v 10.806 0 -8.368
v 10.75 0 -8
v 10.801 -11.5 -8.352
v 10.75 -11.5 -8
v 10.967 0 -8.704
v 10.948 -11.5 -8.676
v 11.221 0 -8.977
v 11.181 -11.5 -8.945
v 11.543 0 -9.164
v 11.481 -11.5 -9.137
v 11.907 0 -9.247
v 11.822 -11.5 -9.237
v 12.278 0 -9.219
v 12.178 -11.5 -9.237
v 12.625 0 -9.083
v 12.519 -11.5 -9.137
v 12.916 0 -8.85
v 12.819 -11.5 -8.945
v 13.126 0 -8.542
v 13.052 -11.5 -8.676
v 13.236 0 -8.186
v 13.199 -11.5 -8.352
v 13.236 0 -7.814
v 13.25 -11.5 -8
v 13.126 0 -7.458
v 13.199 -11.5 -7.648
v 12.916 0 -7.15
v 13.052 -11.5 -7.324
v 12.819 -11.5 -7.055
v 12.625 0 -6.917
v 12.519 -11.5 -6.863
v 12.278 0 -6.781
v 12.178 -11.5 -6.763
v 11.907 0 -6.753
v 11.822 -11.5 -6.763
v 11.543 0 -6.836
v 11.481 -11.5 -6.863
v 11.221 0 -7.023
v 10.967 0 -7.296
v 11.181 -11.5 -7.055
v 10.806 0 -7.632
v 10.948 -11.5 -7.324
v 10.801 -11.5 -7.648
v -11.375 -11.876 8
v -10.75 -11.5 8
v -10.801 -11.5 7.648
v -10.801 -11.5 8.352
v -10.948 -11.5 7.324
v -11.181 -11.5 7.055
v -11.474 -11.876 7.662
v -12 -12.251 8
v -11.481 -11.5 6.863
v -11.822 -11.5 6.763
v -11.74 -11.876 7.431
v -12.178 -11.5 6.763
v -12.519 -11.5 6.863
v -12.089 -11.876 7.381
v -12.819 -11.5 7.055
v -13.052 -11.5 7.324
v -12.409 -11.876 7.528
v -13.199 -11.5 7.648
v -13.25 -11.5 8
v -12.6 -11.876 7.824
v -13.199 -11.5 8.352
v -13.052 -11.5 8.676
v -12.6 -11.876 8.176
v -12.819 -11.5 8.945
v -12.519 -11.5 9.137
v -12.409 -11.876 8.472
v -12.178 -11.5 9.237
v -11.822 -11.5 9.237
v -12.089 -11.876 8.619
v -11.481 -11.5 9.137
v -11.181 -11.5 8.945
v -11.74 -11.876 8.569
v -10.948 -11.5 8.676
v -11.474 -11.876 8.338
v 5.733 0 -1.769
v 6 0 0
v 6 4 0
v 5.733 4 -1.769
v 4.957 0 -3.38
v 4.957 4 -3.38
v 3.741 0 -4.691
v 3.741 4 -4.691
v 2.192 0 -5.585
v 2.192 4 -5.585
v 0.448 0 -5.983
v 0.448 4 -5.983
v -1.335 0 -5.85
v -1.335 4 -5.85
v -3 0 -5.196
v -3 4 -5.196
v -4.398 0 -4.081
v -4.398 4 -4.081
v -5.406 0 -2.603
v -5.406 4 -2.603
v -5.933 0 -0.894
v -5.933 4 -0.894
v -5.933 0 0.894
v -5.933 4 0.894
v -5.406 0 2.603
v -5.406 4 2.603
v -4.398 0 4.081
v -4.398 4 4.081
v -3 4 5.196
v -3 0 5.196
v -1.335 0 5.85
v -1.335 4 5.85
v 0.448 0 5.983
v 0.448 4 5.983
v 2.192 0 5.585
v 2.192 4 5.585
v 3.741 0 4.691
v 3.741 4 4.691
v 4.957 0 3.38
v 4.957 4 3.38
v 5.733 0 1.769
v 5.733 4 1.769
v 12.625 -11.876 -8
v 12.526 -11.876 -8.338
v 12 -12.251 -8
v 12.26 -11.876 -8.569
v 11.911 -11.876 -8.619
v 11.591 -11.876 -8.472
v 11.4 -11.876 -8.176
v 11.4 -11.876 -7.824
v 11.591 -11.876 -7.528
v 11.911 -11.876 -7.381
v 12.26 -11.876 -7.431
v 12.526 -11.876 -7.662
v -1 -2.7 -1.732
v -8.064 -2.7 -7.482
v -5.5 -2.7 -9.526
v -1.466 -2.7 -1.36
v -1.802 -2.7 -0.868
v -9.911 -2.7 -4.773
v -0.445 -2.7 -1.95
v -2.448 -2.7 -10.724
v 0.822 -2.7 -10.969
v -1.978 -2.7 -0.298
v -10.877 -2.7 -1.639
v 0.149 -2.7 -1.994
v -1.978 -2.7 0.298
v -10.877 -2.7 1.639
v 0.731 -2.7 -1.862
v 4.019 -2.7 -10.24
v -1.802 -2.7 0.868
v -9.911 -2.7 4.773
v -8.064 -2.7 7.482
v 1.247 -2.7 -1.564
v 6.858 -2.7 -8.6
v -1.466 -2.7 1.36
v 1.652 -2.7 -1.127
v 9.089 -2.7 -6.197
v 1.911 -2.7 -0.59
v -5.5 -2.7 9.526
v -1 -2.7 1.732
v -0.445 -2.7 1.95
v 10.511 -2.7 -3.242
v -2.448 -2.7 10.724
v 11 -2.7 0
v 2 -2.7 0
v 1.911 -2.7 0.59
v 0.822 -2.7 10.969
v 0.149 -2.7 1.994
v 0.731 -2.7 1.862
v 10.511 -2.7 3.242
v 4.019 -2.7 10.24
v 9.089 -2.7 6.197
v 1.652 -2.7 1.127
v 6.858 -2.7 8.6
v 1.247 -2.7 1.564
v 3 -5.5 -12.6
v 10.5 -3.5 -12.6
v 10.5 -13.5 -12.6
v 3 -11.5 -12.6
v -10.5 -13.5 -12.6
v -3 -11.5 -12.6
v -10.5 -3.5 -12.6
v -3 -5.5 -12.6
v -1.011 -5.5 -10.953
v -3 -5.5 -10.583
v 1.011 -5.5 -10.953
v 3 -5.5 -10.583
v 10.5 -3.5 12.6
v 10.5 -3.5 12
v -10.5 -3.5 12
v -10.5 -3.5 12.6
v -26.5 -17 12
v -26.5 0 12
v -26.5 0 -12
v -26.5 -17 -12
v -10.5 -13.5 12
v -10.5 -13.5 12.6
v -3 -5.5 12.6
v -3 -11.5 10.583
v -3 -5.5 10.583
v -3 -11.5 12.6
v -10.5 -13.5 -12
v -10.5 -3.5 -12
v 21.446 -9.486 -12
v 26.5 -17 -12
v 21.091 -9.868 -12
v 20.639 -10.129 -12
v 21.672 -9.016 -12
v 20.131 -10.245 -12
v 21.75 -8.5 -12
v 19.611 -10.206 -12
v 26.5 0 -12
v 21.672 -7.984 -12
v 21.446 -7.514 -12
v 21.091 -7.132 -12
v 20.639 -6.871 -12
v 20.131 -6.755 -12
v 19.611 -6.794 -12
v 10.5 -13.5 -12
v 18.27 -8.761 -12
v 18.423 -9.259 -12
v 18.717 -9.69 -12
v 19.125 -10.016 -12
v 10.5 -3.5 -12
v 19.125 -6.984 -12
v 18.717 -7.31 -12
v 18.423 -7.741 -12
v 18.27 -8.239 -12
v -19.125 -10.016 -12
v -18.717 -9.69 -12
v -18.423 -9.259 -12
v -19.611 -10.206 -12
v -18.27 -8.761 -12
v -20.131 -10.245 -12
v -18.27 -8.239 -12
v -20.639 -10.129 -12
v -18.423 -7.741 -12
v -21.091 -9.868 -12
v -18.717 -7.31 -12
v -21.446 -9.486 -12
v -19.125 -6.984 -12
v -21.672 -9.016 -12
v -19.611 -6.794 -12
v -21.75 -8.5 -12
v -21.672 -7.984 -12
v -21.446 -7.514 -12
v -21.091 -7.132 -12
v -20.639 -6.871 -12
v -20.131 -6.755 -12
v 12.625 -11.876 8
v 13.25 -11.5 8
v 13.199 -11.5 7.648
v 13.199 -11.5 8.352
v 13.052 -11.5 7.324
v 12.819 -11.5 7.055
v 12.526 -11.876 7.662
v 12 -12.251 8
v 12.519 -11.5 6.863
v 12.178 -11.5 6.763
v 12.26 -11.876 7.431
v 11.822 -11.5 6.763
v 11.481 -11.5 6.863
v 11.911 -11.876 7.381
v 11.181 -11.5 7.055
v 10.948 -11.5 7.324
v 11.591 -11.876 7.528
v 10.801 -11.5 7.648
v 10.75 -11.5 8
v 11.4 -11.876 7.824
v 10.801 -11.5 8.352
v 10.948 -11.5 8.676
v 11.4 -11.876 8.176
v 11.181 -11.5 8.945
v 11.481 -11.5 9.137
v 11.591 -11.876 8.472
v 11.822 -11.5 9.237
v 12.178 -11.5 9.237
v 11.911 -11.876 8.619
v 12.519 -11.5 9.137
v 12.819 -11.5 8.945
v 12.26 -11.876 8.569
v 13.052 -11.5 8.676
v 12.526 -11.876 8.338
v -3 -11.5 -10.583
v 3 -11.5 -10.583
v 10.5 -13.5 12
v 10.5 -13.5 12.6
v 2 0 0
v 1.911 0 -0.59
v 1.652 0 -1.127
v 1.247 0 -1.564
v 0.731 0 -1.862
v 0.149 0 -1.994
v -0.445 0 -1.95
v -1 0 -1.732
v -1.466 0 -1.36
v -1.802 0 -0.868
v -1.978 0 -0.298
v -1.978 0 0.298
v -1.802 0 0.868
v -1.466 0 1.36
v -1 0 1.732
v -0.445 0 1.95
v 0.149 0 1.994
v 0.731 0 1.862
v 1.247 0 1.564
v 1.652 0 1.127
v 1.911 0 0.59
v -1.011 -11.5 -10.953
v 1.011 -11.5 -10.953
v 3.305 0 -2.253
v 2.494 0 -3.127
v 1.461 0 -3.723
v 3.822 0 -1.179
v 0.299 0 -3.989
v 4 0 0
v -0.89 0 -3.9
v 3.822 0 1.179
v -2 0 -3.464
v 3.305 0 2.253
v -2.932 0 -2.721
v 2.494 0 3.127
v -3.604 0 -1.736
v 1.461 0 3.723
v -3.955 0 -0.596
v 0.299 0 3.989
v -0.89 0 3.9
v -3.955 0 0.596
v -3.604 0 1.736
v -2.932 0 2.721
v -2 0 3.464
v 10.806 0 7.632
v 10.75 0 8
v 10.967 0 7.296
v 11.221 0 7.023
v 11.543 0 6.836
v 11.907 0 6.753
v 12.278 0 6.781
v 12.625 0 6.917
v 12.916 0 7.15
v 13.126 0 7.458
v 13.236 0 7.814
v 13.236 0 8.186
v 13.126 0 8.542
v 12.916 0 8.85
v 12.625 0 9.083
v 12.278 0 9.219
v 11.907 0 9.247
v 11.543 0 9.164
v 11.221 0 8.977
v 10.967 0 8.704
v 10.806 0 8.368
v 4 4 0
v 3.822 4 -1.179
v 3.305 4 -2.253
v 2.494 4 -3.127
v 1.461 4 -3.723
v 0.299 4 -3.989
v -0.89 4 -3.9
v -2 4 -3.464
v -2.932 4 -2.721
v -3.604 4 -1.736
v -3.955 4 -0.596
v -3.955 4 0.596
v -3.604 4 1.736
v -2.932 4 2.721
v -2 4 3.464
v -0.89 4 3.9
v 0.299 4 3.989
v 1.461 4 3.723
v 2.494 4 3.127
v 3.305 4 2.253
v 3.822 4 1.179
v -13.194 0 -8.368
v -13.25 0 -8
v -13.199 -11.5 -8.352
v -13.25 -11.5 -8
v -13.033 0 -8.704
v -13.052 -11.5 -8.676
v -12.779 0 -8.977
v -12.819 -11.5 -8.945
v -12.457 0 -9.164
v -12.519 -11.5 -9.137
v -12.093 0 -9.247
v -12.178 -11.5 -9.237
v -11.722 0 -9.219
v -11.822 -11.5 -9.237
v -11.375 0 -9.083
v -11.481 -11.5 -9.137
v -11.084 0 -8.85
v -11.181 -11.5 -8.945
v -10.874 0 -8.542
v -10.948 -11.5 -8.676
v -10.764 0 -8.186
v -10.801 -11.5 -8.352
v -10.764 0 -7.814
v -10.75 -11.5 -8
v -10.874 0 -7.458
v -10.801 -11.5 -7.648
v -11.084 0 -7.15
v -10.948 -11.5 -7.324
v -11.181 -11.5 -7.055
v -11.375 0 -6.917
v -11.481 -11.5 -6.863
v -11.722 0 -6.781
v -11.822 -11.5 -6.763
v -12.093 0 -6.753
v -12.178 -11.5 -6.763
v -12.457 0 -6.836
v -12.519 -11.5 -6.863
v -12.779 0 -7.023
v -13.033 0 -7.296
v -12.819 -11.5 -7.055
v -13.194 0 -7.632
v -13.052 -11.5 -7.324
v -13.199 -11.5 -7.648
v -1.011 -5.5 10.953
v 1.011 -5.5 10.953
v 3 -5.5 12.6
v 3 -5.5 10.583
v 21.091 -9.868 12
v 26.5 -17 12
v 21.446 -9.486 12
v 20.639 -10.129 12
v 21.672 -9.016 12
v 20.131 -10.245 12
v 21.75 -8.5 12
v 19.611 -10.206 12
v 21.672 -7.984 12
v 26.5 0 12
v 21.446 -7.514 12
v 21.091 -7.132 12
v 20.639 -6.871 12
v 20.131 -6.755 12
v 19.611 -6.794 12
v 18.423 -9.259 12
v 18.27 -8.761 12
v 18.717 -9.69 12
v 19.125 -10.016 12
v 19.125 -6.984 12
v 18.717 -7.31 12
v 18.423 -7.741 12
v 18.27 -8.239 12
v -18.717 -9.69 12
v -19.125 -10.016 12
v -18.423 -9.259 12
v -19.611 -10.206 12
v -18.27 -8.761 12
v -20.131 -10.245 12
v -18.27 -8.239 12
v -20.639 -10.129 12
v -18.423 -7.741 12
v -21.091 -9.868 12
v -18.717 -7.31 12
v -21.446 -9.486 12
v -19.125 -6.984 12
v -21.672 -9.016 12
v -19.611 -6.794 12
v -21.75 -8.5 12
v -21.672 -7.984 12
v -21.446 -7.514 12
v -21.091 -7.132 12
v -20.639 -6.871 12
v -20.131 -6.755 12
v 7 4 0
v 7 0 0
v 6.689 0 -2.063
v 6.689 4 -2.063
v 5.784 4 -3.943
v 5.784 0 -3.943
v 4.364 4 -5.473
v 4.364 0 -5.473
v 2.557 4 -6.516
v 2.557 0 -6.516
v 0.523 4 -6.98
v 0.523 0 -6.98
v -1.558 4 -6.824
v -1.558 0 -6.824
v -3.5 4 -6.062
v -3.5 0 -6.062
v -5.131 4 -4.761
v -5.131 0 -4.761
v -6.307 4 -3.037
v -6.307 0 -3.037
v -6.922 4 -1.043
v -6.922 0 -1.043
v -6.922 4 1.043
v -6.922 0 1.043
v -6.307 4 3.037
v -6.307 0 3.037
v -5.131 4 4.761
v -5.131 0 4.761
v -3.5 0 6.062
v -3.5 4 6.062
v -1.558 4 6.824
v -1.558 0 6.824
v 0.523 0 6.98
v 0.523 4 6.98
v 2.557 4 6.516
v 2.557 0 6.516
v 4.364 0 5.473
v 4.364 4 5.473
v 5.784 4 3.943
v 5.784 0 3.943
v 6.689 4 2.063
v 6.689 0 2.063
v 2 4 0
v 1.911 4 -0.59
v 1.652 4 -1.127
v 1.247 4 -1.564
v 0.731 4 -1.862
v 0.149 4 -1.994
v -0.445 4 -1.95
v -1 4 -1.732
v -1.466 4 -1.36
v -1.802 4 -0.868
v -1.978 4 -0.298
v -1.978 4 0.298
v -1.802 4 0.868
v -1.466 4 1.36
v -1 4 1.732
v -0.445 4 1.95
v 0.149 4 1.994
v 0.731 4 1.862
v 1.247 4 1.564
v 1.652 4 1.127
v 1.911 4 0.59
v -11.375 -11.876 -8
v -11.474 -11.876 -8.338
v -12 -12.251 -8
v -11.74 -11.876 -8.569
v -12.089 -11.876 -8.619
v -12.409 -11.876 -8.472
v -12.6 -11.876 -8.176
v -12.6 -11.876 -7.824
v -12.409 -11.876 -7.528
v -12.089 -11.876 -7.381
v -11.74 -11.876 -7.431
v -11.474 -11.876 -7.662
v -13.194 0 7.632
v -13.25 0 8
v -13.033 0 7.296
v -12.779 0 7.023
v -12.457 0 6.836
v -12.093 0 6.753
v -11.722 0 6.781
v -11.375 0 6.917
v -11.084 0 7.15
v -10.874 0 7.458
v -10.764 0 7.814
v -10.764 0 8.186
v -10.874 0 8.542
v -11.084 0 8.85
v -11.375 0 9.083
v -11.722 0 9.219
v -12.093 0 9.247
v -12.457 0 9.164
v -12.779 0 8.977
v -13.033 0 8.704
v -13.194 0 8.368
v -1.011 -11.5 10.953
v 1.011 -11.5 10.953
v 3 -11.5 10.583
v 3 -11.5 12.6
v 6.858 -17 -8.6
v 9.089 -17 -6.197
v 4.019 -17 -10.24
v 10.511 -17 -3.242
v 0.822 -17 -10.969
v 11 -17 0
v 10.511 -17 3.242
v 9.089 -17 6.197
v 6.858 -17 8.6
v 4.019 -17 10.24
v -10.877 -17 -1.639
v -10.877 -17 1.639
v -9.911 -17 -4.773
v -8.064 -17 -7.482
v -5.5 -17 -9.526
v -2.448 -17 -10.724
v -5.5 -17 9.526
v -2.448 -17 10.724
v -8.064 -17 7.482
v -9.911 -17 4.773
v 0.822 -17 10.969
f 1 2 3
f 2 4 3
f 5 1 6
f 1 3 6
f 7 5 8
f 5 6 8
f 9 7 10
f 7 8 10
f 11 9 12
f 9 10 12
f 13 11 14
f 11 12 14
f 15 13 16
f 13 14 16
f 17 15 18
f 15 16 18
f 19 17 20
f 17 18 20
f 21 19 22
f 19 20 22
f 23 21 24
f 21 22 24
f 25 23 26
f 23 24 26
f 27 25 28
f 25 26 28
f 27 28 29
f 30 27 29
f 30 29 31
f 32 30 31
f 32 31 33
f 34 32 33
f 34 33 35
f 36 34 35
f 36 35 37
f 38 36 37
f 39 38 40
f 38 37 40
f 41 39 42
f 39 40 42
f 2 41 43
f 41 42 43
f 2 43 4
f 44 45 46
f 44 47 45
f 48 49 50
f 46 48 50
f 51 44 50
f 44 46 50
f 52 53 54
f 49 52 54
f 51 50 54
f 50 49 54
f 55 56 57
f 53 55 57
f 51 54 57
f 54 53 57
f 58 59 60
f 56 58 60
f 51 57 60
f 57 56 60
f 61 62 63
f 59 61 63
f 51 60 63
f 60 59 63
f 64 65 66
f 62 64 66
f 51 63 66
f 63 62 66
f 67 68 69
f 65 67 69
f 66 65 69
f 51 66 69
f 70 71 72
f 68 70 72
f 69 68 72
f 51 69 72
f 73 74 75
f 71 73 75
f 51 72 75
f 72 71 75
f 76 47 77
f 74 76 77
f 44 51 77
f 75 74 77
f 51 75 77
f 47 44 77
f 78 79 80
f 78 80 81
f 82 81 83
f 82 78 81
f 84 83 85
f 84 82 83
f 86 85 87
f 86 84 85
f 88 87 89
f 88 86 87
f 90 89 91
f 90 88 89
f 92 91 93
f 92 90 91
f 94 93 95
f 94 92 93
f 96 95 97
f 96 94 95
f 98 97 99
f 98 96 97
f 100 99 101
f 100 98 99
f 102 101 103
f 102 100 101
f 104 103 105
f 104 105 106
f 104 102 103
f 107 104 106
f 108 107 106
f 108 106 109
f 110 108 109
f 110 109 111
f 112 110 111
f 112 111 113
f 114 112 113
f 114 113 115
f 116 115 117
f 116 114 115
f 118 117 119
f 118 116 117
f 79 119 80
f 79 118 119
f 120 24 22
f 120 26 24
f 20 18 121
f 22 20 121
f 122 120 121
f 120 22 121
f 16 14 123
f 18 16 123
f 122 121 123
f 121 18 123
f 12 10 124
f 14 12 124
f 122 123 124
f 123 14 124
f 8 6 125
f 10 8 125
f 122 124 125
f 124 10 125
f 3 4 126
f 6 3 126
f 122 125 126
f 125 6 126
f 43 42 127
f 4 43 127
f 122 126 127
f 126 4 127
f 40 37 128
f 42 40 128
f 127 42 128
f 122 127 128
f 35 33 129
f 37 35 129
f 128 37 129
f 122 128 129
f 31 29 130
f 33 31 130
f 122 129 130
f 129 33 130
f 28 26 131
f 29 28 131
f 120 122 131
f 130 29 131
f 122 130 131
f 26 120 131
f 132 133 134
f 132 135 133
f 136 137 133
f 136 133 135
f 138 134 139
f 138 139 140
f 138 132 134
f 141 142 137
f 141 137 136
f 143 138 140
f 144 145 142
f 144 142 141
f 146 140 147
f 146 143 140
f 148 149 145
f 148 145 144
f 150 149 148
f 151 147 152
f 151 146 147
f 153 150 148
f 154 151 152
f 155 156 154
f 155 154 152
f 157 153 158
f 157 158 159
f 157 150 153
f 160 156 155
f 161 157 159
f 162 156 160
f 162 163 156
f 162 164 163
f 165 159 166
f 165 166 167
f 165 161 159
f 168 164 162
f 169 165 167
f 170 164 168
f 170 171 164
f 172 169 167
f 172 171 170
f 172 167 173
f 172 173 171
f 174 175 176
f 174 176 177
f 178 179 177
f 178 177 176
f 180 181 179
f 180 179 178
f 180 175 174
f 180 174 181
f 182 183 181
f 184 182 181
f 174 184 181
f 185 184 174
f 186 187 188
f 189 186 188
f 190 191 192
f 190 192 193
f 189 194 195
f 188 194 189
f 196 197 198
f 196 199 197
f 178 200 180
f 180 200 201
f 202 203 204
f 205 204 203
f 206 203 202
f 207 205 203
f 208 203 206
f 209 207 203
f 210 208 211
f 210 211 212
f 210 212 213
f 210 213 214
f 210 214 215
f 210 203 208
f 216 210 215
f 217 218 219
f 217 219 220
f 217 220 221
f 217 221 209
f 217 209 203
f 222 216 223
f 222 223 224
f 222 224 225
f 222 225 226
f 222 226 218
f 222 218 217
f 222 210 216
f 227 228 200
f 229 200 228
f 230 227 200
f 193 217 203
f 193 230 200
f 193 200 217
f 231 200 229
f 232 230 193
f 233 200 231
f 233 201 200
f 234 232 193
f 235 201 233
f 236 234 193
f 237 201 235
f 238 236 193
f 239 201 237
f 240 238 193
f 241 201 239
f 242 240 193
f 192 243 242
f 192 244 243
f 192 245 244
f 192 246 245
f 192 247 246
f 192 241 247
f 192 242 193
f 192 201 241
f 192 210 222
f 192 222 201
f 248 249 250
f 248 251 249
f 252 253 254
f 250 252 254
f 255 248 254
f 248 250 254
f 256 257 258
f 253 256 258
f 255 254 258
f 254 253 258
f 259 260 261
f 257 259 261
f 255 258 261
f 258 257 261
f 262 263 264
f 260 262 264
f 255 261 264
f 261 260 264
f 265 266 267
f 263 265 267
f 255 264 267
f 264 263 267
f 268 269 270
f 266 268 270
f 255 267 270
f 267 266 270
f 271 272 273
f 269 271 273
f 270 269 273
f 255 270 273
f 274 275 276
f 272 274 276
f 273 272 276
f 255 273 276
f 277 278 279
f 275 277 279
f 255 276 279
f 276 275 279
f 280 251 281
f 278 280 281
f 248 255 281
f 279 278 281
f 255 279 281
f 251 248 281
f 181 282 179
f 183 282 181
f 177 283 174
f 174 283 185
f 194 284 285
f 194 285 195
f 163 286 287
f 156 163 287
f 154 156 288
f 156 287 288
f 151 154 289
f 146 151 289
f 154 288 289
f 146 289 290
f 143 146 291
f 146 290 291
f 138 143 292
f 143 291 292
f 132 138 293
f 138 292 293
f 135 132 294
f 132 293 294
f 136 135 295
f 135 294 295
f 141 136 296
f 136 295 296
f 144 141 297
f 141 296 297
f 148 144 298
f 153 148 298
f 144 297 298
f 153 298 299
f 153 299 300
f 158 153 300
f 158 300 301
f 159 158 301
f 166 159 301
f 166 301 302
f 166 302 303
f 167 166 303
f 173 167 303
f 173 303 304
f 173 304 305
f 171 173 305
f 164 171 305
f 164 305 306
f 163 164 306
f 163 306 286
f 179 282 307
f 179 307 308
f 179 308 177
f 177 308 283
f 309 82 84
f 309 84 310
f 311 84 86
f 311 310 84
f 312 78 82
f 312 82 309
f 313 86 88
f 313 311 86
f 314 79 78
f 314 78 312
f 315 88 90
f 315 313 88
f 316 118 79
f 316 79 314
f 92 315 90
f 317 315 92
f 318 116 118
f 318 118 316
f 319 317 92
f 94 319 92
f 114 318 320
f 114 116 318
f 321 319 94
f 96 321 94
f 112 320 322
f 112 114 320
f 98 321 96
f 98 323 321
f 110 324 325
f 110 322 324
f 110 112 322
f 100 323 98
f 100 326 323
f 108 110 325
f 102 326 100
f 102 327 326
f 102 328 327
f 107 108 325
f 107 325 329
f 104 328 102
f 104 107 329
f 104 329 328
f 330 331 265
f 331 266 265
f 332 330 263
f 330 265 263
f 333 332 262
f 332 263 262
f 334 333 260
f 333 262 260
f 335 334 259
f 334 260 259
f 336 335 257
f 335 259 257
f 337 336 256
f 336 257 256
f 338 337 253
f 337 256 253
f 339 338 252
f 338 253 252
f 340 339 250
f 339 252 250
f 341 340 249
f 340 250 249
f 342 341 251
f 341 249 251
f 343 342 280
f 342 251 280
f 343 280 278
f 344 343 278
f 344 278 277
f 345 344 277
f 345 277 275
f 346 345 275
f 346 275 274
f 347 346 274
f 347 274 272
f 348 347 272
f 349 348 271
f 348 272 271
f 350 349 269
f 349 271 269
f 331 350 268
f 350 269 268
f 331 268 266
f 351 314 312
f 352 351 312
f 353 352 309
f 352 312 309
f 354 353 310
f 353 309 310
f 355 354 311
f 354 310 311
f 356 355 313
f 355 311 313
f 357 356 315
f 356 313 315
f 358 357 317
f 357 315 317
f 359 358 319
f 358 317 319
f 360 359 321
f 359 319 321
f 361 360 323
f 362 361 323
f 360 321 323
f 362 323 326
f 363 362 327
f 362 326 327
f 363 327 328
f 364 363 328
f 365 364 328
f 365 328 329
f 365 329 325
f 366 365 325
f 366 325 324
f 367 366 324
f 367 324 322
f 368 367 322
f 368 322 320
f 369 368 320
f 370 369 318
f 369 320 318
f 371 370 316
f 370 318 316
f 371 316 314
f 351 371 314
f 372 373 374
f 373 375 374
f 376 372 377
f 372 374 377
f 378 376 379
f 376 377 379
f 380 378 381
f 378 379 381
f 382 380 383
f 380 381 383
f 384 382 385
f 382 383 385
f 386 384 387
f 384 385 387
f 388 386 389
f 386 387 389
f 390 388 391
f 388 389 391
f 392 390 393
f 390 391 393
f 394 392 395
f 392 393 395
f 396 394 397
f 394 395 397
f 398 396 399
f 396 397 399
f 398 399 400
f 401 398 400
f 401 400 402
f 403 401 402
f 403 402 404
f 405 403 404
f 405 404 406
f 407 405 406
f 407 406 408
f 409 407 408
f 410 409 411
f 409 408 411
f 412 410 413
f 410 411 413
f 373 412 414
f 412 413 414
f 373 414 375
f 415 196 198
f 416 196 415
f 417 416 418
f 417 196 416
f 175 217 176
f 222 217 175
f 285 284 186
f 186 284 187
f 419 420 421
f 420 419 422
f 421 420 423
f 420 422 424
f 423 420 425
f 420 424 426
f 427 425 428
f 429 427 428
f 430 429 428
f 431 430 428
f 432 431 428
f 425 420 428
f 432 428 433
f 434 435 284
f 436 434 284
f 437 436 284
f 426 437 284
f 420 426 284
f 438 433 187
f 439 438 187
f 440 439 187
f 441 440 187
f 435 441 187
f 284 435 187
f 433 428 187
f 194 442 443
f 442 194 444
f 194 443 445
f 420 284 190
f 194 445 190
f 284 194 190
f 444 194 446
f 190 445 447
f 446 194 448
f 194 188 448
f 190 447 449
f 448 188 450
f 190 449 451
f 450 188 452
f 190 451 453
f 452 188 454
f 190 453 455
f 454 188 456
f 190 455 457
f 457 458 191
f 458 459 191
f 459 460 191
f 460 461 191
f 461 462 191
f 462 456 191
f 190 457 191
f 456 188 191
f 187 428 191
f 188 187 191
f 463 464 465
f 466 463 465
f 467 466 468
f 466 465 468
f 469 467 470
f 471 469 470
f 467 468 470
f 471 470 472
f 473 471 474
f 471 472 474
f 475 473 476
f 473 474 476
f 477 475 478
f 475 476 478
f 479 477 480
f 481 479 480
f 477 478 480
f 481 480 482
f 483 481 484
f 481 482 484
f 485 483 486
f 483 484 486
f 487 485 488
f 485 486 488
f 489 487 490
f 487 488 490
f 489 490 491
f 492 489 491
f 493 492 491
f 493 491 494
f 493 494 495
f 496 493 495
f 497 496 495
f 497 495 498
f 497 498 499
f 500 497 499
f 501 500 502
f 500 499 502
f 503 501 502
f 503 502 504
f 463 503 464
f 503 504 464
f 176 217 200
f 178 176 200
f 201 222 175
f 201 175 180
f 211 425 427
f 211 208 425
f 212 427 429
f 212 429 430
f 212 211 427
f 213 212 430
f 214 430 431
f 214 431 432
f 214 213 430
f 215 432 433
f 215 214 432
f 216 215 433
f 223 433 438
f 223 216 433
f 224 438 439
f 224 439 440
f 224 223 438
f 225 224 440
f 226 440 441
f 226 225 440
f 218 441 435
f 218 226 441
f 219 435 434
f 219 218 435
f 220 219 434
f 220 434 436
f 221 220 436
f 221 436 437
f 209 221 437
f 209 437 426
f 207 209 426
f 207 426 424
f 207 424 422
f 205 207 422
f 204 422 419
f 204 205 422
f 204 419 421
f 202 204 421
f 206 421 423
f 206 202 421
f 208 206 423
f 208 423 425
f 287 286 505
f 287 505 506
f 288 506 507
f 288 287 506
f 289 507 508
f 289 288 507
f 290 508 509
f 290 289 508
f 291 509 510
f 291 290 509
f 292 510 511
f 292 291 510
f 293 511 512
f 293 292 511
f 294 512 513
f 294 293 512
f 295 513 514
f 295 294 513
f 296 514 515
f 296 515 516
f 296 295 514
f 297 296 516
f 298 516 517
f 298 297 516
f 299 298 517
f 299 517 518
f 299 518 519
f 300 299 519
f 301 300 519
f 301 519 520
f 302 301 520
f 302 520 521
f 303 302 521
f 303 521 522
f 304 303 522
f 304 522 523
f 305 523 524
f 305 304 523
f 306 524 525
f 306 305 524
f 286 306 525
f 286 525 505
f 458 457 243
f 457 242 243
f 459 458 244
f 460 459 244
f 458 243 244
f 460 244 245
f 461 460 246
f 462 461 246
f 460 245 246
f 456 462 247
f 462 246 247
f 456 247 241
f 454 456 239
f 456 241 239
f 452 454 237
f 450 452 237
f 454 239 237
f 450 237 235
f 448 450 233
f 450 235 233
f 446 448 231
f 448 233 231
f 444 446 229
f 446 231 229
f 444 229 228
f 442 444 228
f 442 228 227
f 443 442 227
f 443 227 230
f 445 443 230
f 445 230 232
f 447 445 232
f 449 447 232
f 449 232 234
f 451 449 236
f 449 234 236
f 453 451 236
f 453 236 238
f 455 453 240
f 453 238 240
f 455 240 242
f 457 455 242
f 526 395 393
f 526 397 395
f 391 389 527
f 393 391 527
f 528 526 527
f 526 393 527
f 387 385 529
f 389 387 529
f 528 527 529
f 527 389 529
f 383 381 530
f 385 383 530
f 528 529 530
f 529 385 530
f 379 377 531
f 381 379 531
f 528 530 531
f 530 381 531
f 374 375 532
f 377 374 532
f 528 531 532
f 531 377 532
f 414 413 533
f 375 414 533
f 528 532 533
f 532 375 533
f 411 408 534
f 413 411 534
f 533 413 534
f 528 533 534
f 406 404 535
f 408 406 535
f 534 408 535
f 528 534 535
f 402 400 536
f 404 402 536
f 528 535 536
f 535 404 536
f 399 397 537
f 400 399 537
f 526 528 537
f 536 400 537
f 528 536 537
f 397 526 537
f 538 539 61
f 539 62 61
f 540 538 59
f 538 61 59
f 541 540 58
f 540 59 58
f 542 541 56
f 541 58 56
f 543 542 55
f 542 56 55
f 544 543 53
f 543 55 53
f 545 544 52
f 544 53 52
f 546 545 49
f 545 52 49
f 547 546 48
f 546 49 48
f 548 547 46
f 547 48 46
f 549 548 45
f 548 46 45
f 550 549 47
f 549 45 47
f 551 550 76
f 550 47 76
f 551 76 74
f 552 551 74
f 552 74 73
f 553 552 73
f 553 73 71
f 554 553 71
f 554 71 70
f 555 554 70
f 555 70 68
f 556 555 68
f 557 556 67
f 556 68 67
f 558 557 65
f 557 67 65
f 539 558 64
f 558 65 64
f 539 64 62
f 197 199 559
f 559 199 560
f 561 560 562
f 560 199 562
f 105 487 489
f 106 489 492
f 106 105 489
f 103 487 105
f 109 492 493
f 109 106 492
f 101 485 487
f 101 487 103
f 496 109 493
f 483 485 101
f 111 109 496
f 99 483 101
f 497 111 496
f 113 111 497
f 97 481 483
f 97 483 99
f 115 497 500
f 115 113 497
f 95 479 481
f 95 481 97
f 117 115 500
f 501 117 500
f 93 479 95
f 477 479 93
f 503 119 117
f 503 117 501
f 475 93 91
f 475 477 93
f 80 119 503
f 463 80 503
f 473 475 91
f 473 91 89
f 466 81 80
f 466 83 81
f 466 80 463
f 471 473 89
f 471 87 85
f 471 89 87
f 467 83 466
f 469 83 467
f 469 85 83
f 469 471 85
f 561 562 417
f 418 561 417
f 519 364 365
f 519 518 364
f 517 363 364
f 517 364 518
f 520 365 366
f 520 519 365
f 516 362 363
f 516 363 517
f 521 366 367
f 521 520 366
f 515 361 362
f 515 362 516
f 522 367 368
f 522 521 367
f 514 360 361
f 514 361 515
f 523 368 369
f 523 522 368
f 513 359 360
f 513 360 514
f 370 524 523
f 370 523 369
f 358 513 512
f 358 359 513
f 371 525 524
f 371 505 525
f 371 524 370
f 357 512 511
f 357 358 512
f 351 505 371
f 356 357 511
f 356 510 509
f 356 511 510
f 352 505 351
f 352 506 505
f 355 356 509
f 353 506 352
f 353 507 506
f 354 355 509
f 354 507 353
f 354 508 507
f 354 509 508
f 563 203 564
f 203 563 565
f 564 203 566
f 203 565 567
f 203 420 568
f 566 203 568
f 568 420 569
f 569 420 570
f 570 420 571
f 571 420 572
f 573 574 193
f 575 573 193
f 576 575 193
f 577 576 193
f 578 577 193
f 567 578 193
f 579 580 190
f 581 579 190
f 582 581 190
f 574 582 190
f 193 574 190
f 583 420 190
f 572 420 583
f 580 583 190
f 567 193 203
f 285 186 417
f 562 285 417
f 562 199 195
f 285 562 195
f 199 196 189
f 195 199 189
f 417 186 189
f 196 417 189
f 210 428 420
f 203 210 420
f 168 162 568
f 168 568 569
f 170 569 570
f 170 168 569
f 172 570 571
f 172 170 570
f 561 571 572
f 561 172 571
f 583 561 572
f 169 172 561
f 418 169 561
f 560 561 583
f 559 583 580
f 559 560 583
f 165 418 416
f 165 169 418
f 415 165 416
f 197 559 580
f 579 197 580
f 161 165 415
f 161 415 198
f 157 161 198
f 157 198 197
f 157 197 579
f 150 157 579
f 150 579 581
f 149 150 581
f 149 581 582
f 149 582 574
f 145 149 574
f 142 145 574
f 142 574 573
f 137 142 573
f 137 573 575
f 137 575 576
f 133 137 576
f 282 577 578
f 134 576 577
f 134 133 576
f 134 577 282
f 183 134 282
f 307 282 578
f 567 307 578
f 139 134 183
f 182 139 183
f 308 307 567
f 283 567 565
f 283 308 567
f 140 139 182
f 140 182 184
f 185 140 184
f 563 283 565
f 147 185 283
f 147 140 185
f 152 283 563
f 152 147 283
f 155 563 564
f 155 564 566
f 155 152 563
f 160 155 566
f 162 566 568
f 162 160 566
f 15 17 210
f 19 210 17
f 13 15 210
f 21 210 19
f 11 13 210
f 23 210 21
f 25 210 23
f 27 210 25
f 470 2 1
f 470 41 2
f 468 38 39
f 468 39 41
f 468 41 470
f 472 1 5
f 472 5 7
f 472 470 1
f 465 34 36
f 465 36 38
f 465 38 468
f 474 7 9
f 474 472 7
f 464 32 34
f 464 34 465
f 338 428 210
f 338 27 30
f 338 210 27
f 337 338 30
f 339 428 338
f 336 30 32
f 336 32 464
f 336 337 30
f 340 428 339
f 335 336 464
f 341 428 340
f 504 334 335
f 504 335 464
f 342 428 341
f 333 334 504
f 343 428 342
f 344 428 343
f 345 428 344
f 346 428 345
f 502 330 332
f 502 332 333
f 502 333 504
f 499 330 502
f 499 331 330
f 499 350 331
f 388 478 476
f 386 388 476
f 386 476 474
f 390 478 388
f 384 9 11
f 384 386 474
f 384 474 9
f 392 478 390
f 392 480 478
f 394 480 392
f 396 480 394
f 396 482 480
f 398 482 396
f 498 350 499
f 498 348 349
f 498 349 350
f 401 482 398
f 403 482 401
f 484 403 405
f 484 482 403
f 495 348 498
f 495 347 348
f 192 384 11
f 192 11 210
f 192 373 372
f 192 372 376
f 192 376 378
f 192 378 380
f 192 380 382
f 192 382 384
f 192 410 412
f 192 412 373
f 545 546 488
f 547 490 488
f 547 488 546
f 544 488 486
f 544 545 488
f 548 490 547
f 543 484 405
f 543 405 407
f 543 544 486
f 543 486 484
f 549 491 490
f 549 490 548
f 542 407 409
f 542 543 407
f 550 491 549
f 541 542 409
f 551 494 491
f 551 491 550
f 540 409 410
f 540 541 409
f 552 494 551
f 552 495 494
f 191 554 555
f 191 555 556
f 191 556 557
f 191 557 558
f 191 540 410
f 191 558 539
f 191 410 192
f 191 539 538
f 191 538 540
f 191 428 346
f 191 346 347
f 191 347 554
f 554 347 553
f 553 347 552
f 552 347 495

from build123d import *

# Parameters (mm, degrees)
SKETCH_1_R          = 1.75
EXTRUDE_1_DEPTH     = 12
SKETCH_3_R          = 2
CUT_EXTRUDE_1_DEPTH = 18
SKETCH_4_W          = 22.4
SKETCH_4_H          = 14.3
SKETCH_4_W_2        = 6
SKETCH_4_H_2        = 6
EXTRUDE_2_DEPTH     = 1.2
SKETCH_5_W          = 21
SKETCH_5_H          = 10
SKETCH_5_W_2        = 6
SKETCH_5_H_2        = 6
EXTRUDE_3_DEPTH     = 0.6
SKETCH_14_W         = 24.4
SKETCH_14_H         = 23.6
EXTRUDE_6_DEPTH     = 14.3
CUT_EXTRUDE_START   = 2.7
SKETCH_12_R         = 11
CUT_EXTRUDE_6_DEPTH = 14.3
SKETCH_15_W         = 6
SKETCH_15_H         = 6
CUT_EXTRUDE_7_DEPTH = 25.4
SKETCH_6_R          = 7
SKETCH_6_R_2        = 6
SKETCH_6_R_3        = 4
SKETCH_6_R_4        = 2
EXTRUDE_4_DEPTH     = 4
M3X0_51_D           = 2.5
M3X0_51_DEPTH       = 11.5
M3X0_51_TIP         = 0.751075774


with BuildPart() as part:
    # Sketch 1 → Extrude 1 (new body, symmetric)
    with BuildSketch(Plane.XY):
        Polygon((11.2, -17), (11.2, -2.7), (0, -2.7), (0, 0), (26.5, 0), (26.5, -17), align=None)
        with Locations((20, -8.5)):
            Circle(SKETCH_1_R, mode=Mode.SUBTRACT)
    extrude_1 = extrude(amount=EXTRUDE_1_DEPTH, both=True)

    # Mirror 1: Extrude 1 across plane
    add(extrude_1.mirror(Plane(origin=(0, -2.7, -12), x_dir=(0, 0, 1), z_dir=(-1, 0, 0))))

    # Sketch 3 → Cut-Extrude 1 (cut, through all)
    with BuildSketch(Plane(origin=(0, 0, 0), x_dir=(1, 0, 0), z_dir=(0, 1, 0))):
        Circle(SKETCH_3_R)
    extrude(amount=-CUT_EXTRUDE_1_DEPTH, mode=Mode.SUBTRACT)

    # Sketch 4 → Extrude 2 (add)
    with BuildSketch(Plane(origin=(0, 0, -12), x_dir=(-1, 0, 0), z_dir=(0, 0, -1))):
        with Locations((0, -9.85)):
            Rectangle(SKETCH_4_W, SKETCH_4_H)
        with Locations((0, -8.5)):
            Rectangle(SKETCH_4_W_2, SKETCH_4_H_2, mode=Mode.SUBTRACT)
    extrude_2 = extrude(amount=-EXTRUDE_2_DEPTH)

    # Sketch 5 → Extrude 3 (add)
    with BuildSketch(Plane(origin=(0, 0, -12), x_dir=(-1, 0, 0), z_dir=(0, 0, -1))):
        with Locations((0, -8.5)):
            Rectangle(SKETCH_5_W, SKETCH_5_H)
        with Locations((0, -8.5)):
            Rectangle(SKETCH_5_W_2, SKETCH_5_H_2, mode=Mode.SUBTRACT)
    extrude_3 = extrude(amount=EXTRUDE_3_DEPTH)

    # Mirror 2: Extrude 2, Extrude 3 across plane
    add(extrude_2.mirror(Plane.XY))
    add(extrude_3.mirror(Plane.XY))

    # Sketch 14 → Extrude 6 (add)
    with BuildSketch(Plane.XZ.offset(2.7)):
        Rectangle(SKETCH_14_W, SKETCH_14_H)
    extrude(amount=EXTRUDE_6_DEPTH)

    # Sketch 12 → Cut-Extrude 6 (cut)
    with BuildSketch(Plane.XZ.offset(CUT_EXTRUDE_START)):
        Circle(SKETCH_12_R)
    extrude(amount=CUT_EXTRUDE_6_DEPTH, mode=Mode.SUBTRACT)

    # Sketch 15 → Cut-Extrude 7 (cut, through all)
    with BuildSketch(Plane.XY.offset(11.8)):
        with Locations((0, -8.5)):
            Rectangle(SKETCH_15_W, SKETCH_15_H)
    extrude(amount=-CUT_EXTRUDE_7_DEPTH, mode=Mode.SUBTRACT)

    # Sketch 6 → Extrude 4 (add)
    with BuildSketch(Plane(origin=(0, 0, 0), x_dir=(1, 0, 0), z_dir=(0, 1, 0))):
        Circle(SKETCH_6_R)
        Circle(SKETCH_6_R_2, mode=Mode.SUBTRACT)
        Circle(SKETCH_6_R_3)
        Circle(SKETCH_6_R_4, mode=Mode.SUBTRACT)
    extrude(amount=EXTRUDE_4_DEPTH)

    # M3x0.51
    with Locations(Plane(origin=(0, 0, 0), x_dir=(1, 0, 0), z_dir=(0, 1, 0))):
        with Locations((12, 8), (12, -8), (-12, -8), (-12, 8)):
            Hole(M3X0_51_D / 2, depth=M3X0_51_DEPTH)
            with Locations((0, 0, -(M3X0_51_DEPTH + M3X0_51_TIP / 2))):  # 118° drill point
                Cone(0, M3X0_51_D / 2, M3X0_51_TIP, mode=Mode.SUBTRACT)


solid = part.part
